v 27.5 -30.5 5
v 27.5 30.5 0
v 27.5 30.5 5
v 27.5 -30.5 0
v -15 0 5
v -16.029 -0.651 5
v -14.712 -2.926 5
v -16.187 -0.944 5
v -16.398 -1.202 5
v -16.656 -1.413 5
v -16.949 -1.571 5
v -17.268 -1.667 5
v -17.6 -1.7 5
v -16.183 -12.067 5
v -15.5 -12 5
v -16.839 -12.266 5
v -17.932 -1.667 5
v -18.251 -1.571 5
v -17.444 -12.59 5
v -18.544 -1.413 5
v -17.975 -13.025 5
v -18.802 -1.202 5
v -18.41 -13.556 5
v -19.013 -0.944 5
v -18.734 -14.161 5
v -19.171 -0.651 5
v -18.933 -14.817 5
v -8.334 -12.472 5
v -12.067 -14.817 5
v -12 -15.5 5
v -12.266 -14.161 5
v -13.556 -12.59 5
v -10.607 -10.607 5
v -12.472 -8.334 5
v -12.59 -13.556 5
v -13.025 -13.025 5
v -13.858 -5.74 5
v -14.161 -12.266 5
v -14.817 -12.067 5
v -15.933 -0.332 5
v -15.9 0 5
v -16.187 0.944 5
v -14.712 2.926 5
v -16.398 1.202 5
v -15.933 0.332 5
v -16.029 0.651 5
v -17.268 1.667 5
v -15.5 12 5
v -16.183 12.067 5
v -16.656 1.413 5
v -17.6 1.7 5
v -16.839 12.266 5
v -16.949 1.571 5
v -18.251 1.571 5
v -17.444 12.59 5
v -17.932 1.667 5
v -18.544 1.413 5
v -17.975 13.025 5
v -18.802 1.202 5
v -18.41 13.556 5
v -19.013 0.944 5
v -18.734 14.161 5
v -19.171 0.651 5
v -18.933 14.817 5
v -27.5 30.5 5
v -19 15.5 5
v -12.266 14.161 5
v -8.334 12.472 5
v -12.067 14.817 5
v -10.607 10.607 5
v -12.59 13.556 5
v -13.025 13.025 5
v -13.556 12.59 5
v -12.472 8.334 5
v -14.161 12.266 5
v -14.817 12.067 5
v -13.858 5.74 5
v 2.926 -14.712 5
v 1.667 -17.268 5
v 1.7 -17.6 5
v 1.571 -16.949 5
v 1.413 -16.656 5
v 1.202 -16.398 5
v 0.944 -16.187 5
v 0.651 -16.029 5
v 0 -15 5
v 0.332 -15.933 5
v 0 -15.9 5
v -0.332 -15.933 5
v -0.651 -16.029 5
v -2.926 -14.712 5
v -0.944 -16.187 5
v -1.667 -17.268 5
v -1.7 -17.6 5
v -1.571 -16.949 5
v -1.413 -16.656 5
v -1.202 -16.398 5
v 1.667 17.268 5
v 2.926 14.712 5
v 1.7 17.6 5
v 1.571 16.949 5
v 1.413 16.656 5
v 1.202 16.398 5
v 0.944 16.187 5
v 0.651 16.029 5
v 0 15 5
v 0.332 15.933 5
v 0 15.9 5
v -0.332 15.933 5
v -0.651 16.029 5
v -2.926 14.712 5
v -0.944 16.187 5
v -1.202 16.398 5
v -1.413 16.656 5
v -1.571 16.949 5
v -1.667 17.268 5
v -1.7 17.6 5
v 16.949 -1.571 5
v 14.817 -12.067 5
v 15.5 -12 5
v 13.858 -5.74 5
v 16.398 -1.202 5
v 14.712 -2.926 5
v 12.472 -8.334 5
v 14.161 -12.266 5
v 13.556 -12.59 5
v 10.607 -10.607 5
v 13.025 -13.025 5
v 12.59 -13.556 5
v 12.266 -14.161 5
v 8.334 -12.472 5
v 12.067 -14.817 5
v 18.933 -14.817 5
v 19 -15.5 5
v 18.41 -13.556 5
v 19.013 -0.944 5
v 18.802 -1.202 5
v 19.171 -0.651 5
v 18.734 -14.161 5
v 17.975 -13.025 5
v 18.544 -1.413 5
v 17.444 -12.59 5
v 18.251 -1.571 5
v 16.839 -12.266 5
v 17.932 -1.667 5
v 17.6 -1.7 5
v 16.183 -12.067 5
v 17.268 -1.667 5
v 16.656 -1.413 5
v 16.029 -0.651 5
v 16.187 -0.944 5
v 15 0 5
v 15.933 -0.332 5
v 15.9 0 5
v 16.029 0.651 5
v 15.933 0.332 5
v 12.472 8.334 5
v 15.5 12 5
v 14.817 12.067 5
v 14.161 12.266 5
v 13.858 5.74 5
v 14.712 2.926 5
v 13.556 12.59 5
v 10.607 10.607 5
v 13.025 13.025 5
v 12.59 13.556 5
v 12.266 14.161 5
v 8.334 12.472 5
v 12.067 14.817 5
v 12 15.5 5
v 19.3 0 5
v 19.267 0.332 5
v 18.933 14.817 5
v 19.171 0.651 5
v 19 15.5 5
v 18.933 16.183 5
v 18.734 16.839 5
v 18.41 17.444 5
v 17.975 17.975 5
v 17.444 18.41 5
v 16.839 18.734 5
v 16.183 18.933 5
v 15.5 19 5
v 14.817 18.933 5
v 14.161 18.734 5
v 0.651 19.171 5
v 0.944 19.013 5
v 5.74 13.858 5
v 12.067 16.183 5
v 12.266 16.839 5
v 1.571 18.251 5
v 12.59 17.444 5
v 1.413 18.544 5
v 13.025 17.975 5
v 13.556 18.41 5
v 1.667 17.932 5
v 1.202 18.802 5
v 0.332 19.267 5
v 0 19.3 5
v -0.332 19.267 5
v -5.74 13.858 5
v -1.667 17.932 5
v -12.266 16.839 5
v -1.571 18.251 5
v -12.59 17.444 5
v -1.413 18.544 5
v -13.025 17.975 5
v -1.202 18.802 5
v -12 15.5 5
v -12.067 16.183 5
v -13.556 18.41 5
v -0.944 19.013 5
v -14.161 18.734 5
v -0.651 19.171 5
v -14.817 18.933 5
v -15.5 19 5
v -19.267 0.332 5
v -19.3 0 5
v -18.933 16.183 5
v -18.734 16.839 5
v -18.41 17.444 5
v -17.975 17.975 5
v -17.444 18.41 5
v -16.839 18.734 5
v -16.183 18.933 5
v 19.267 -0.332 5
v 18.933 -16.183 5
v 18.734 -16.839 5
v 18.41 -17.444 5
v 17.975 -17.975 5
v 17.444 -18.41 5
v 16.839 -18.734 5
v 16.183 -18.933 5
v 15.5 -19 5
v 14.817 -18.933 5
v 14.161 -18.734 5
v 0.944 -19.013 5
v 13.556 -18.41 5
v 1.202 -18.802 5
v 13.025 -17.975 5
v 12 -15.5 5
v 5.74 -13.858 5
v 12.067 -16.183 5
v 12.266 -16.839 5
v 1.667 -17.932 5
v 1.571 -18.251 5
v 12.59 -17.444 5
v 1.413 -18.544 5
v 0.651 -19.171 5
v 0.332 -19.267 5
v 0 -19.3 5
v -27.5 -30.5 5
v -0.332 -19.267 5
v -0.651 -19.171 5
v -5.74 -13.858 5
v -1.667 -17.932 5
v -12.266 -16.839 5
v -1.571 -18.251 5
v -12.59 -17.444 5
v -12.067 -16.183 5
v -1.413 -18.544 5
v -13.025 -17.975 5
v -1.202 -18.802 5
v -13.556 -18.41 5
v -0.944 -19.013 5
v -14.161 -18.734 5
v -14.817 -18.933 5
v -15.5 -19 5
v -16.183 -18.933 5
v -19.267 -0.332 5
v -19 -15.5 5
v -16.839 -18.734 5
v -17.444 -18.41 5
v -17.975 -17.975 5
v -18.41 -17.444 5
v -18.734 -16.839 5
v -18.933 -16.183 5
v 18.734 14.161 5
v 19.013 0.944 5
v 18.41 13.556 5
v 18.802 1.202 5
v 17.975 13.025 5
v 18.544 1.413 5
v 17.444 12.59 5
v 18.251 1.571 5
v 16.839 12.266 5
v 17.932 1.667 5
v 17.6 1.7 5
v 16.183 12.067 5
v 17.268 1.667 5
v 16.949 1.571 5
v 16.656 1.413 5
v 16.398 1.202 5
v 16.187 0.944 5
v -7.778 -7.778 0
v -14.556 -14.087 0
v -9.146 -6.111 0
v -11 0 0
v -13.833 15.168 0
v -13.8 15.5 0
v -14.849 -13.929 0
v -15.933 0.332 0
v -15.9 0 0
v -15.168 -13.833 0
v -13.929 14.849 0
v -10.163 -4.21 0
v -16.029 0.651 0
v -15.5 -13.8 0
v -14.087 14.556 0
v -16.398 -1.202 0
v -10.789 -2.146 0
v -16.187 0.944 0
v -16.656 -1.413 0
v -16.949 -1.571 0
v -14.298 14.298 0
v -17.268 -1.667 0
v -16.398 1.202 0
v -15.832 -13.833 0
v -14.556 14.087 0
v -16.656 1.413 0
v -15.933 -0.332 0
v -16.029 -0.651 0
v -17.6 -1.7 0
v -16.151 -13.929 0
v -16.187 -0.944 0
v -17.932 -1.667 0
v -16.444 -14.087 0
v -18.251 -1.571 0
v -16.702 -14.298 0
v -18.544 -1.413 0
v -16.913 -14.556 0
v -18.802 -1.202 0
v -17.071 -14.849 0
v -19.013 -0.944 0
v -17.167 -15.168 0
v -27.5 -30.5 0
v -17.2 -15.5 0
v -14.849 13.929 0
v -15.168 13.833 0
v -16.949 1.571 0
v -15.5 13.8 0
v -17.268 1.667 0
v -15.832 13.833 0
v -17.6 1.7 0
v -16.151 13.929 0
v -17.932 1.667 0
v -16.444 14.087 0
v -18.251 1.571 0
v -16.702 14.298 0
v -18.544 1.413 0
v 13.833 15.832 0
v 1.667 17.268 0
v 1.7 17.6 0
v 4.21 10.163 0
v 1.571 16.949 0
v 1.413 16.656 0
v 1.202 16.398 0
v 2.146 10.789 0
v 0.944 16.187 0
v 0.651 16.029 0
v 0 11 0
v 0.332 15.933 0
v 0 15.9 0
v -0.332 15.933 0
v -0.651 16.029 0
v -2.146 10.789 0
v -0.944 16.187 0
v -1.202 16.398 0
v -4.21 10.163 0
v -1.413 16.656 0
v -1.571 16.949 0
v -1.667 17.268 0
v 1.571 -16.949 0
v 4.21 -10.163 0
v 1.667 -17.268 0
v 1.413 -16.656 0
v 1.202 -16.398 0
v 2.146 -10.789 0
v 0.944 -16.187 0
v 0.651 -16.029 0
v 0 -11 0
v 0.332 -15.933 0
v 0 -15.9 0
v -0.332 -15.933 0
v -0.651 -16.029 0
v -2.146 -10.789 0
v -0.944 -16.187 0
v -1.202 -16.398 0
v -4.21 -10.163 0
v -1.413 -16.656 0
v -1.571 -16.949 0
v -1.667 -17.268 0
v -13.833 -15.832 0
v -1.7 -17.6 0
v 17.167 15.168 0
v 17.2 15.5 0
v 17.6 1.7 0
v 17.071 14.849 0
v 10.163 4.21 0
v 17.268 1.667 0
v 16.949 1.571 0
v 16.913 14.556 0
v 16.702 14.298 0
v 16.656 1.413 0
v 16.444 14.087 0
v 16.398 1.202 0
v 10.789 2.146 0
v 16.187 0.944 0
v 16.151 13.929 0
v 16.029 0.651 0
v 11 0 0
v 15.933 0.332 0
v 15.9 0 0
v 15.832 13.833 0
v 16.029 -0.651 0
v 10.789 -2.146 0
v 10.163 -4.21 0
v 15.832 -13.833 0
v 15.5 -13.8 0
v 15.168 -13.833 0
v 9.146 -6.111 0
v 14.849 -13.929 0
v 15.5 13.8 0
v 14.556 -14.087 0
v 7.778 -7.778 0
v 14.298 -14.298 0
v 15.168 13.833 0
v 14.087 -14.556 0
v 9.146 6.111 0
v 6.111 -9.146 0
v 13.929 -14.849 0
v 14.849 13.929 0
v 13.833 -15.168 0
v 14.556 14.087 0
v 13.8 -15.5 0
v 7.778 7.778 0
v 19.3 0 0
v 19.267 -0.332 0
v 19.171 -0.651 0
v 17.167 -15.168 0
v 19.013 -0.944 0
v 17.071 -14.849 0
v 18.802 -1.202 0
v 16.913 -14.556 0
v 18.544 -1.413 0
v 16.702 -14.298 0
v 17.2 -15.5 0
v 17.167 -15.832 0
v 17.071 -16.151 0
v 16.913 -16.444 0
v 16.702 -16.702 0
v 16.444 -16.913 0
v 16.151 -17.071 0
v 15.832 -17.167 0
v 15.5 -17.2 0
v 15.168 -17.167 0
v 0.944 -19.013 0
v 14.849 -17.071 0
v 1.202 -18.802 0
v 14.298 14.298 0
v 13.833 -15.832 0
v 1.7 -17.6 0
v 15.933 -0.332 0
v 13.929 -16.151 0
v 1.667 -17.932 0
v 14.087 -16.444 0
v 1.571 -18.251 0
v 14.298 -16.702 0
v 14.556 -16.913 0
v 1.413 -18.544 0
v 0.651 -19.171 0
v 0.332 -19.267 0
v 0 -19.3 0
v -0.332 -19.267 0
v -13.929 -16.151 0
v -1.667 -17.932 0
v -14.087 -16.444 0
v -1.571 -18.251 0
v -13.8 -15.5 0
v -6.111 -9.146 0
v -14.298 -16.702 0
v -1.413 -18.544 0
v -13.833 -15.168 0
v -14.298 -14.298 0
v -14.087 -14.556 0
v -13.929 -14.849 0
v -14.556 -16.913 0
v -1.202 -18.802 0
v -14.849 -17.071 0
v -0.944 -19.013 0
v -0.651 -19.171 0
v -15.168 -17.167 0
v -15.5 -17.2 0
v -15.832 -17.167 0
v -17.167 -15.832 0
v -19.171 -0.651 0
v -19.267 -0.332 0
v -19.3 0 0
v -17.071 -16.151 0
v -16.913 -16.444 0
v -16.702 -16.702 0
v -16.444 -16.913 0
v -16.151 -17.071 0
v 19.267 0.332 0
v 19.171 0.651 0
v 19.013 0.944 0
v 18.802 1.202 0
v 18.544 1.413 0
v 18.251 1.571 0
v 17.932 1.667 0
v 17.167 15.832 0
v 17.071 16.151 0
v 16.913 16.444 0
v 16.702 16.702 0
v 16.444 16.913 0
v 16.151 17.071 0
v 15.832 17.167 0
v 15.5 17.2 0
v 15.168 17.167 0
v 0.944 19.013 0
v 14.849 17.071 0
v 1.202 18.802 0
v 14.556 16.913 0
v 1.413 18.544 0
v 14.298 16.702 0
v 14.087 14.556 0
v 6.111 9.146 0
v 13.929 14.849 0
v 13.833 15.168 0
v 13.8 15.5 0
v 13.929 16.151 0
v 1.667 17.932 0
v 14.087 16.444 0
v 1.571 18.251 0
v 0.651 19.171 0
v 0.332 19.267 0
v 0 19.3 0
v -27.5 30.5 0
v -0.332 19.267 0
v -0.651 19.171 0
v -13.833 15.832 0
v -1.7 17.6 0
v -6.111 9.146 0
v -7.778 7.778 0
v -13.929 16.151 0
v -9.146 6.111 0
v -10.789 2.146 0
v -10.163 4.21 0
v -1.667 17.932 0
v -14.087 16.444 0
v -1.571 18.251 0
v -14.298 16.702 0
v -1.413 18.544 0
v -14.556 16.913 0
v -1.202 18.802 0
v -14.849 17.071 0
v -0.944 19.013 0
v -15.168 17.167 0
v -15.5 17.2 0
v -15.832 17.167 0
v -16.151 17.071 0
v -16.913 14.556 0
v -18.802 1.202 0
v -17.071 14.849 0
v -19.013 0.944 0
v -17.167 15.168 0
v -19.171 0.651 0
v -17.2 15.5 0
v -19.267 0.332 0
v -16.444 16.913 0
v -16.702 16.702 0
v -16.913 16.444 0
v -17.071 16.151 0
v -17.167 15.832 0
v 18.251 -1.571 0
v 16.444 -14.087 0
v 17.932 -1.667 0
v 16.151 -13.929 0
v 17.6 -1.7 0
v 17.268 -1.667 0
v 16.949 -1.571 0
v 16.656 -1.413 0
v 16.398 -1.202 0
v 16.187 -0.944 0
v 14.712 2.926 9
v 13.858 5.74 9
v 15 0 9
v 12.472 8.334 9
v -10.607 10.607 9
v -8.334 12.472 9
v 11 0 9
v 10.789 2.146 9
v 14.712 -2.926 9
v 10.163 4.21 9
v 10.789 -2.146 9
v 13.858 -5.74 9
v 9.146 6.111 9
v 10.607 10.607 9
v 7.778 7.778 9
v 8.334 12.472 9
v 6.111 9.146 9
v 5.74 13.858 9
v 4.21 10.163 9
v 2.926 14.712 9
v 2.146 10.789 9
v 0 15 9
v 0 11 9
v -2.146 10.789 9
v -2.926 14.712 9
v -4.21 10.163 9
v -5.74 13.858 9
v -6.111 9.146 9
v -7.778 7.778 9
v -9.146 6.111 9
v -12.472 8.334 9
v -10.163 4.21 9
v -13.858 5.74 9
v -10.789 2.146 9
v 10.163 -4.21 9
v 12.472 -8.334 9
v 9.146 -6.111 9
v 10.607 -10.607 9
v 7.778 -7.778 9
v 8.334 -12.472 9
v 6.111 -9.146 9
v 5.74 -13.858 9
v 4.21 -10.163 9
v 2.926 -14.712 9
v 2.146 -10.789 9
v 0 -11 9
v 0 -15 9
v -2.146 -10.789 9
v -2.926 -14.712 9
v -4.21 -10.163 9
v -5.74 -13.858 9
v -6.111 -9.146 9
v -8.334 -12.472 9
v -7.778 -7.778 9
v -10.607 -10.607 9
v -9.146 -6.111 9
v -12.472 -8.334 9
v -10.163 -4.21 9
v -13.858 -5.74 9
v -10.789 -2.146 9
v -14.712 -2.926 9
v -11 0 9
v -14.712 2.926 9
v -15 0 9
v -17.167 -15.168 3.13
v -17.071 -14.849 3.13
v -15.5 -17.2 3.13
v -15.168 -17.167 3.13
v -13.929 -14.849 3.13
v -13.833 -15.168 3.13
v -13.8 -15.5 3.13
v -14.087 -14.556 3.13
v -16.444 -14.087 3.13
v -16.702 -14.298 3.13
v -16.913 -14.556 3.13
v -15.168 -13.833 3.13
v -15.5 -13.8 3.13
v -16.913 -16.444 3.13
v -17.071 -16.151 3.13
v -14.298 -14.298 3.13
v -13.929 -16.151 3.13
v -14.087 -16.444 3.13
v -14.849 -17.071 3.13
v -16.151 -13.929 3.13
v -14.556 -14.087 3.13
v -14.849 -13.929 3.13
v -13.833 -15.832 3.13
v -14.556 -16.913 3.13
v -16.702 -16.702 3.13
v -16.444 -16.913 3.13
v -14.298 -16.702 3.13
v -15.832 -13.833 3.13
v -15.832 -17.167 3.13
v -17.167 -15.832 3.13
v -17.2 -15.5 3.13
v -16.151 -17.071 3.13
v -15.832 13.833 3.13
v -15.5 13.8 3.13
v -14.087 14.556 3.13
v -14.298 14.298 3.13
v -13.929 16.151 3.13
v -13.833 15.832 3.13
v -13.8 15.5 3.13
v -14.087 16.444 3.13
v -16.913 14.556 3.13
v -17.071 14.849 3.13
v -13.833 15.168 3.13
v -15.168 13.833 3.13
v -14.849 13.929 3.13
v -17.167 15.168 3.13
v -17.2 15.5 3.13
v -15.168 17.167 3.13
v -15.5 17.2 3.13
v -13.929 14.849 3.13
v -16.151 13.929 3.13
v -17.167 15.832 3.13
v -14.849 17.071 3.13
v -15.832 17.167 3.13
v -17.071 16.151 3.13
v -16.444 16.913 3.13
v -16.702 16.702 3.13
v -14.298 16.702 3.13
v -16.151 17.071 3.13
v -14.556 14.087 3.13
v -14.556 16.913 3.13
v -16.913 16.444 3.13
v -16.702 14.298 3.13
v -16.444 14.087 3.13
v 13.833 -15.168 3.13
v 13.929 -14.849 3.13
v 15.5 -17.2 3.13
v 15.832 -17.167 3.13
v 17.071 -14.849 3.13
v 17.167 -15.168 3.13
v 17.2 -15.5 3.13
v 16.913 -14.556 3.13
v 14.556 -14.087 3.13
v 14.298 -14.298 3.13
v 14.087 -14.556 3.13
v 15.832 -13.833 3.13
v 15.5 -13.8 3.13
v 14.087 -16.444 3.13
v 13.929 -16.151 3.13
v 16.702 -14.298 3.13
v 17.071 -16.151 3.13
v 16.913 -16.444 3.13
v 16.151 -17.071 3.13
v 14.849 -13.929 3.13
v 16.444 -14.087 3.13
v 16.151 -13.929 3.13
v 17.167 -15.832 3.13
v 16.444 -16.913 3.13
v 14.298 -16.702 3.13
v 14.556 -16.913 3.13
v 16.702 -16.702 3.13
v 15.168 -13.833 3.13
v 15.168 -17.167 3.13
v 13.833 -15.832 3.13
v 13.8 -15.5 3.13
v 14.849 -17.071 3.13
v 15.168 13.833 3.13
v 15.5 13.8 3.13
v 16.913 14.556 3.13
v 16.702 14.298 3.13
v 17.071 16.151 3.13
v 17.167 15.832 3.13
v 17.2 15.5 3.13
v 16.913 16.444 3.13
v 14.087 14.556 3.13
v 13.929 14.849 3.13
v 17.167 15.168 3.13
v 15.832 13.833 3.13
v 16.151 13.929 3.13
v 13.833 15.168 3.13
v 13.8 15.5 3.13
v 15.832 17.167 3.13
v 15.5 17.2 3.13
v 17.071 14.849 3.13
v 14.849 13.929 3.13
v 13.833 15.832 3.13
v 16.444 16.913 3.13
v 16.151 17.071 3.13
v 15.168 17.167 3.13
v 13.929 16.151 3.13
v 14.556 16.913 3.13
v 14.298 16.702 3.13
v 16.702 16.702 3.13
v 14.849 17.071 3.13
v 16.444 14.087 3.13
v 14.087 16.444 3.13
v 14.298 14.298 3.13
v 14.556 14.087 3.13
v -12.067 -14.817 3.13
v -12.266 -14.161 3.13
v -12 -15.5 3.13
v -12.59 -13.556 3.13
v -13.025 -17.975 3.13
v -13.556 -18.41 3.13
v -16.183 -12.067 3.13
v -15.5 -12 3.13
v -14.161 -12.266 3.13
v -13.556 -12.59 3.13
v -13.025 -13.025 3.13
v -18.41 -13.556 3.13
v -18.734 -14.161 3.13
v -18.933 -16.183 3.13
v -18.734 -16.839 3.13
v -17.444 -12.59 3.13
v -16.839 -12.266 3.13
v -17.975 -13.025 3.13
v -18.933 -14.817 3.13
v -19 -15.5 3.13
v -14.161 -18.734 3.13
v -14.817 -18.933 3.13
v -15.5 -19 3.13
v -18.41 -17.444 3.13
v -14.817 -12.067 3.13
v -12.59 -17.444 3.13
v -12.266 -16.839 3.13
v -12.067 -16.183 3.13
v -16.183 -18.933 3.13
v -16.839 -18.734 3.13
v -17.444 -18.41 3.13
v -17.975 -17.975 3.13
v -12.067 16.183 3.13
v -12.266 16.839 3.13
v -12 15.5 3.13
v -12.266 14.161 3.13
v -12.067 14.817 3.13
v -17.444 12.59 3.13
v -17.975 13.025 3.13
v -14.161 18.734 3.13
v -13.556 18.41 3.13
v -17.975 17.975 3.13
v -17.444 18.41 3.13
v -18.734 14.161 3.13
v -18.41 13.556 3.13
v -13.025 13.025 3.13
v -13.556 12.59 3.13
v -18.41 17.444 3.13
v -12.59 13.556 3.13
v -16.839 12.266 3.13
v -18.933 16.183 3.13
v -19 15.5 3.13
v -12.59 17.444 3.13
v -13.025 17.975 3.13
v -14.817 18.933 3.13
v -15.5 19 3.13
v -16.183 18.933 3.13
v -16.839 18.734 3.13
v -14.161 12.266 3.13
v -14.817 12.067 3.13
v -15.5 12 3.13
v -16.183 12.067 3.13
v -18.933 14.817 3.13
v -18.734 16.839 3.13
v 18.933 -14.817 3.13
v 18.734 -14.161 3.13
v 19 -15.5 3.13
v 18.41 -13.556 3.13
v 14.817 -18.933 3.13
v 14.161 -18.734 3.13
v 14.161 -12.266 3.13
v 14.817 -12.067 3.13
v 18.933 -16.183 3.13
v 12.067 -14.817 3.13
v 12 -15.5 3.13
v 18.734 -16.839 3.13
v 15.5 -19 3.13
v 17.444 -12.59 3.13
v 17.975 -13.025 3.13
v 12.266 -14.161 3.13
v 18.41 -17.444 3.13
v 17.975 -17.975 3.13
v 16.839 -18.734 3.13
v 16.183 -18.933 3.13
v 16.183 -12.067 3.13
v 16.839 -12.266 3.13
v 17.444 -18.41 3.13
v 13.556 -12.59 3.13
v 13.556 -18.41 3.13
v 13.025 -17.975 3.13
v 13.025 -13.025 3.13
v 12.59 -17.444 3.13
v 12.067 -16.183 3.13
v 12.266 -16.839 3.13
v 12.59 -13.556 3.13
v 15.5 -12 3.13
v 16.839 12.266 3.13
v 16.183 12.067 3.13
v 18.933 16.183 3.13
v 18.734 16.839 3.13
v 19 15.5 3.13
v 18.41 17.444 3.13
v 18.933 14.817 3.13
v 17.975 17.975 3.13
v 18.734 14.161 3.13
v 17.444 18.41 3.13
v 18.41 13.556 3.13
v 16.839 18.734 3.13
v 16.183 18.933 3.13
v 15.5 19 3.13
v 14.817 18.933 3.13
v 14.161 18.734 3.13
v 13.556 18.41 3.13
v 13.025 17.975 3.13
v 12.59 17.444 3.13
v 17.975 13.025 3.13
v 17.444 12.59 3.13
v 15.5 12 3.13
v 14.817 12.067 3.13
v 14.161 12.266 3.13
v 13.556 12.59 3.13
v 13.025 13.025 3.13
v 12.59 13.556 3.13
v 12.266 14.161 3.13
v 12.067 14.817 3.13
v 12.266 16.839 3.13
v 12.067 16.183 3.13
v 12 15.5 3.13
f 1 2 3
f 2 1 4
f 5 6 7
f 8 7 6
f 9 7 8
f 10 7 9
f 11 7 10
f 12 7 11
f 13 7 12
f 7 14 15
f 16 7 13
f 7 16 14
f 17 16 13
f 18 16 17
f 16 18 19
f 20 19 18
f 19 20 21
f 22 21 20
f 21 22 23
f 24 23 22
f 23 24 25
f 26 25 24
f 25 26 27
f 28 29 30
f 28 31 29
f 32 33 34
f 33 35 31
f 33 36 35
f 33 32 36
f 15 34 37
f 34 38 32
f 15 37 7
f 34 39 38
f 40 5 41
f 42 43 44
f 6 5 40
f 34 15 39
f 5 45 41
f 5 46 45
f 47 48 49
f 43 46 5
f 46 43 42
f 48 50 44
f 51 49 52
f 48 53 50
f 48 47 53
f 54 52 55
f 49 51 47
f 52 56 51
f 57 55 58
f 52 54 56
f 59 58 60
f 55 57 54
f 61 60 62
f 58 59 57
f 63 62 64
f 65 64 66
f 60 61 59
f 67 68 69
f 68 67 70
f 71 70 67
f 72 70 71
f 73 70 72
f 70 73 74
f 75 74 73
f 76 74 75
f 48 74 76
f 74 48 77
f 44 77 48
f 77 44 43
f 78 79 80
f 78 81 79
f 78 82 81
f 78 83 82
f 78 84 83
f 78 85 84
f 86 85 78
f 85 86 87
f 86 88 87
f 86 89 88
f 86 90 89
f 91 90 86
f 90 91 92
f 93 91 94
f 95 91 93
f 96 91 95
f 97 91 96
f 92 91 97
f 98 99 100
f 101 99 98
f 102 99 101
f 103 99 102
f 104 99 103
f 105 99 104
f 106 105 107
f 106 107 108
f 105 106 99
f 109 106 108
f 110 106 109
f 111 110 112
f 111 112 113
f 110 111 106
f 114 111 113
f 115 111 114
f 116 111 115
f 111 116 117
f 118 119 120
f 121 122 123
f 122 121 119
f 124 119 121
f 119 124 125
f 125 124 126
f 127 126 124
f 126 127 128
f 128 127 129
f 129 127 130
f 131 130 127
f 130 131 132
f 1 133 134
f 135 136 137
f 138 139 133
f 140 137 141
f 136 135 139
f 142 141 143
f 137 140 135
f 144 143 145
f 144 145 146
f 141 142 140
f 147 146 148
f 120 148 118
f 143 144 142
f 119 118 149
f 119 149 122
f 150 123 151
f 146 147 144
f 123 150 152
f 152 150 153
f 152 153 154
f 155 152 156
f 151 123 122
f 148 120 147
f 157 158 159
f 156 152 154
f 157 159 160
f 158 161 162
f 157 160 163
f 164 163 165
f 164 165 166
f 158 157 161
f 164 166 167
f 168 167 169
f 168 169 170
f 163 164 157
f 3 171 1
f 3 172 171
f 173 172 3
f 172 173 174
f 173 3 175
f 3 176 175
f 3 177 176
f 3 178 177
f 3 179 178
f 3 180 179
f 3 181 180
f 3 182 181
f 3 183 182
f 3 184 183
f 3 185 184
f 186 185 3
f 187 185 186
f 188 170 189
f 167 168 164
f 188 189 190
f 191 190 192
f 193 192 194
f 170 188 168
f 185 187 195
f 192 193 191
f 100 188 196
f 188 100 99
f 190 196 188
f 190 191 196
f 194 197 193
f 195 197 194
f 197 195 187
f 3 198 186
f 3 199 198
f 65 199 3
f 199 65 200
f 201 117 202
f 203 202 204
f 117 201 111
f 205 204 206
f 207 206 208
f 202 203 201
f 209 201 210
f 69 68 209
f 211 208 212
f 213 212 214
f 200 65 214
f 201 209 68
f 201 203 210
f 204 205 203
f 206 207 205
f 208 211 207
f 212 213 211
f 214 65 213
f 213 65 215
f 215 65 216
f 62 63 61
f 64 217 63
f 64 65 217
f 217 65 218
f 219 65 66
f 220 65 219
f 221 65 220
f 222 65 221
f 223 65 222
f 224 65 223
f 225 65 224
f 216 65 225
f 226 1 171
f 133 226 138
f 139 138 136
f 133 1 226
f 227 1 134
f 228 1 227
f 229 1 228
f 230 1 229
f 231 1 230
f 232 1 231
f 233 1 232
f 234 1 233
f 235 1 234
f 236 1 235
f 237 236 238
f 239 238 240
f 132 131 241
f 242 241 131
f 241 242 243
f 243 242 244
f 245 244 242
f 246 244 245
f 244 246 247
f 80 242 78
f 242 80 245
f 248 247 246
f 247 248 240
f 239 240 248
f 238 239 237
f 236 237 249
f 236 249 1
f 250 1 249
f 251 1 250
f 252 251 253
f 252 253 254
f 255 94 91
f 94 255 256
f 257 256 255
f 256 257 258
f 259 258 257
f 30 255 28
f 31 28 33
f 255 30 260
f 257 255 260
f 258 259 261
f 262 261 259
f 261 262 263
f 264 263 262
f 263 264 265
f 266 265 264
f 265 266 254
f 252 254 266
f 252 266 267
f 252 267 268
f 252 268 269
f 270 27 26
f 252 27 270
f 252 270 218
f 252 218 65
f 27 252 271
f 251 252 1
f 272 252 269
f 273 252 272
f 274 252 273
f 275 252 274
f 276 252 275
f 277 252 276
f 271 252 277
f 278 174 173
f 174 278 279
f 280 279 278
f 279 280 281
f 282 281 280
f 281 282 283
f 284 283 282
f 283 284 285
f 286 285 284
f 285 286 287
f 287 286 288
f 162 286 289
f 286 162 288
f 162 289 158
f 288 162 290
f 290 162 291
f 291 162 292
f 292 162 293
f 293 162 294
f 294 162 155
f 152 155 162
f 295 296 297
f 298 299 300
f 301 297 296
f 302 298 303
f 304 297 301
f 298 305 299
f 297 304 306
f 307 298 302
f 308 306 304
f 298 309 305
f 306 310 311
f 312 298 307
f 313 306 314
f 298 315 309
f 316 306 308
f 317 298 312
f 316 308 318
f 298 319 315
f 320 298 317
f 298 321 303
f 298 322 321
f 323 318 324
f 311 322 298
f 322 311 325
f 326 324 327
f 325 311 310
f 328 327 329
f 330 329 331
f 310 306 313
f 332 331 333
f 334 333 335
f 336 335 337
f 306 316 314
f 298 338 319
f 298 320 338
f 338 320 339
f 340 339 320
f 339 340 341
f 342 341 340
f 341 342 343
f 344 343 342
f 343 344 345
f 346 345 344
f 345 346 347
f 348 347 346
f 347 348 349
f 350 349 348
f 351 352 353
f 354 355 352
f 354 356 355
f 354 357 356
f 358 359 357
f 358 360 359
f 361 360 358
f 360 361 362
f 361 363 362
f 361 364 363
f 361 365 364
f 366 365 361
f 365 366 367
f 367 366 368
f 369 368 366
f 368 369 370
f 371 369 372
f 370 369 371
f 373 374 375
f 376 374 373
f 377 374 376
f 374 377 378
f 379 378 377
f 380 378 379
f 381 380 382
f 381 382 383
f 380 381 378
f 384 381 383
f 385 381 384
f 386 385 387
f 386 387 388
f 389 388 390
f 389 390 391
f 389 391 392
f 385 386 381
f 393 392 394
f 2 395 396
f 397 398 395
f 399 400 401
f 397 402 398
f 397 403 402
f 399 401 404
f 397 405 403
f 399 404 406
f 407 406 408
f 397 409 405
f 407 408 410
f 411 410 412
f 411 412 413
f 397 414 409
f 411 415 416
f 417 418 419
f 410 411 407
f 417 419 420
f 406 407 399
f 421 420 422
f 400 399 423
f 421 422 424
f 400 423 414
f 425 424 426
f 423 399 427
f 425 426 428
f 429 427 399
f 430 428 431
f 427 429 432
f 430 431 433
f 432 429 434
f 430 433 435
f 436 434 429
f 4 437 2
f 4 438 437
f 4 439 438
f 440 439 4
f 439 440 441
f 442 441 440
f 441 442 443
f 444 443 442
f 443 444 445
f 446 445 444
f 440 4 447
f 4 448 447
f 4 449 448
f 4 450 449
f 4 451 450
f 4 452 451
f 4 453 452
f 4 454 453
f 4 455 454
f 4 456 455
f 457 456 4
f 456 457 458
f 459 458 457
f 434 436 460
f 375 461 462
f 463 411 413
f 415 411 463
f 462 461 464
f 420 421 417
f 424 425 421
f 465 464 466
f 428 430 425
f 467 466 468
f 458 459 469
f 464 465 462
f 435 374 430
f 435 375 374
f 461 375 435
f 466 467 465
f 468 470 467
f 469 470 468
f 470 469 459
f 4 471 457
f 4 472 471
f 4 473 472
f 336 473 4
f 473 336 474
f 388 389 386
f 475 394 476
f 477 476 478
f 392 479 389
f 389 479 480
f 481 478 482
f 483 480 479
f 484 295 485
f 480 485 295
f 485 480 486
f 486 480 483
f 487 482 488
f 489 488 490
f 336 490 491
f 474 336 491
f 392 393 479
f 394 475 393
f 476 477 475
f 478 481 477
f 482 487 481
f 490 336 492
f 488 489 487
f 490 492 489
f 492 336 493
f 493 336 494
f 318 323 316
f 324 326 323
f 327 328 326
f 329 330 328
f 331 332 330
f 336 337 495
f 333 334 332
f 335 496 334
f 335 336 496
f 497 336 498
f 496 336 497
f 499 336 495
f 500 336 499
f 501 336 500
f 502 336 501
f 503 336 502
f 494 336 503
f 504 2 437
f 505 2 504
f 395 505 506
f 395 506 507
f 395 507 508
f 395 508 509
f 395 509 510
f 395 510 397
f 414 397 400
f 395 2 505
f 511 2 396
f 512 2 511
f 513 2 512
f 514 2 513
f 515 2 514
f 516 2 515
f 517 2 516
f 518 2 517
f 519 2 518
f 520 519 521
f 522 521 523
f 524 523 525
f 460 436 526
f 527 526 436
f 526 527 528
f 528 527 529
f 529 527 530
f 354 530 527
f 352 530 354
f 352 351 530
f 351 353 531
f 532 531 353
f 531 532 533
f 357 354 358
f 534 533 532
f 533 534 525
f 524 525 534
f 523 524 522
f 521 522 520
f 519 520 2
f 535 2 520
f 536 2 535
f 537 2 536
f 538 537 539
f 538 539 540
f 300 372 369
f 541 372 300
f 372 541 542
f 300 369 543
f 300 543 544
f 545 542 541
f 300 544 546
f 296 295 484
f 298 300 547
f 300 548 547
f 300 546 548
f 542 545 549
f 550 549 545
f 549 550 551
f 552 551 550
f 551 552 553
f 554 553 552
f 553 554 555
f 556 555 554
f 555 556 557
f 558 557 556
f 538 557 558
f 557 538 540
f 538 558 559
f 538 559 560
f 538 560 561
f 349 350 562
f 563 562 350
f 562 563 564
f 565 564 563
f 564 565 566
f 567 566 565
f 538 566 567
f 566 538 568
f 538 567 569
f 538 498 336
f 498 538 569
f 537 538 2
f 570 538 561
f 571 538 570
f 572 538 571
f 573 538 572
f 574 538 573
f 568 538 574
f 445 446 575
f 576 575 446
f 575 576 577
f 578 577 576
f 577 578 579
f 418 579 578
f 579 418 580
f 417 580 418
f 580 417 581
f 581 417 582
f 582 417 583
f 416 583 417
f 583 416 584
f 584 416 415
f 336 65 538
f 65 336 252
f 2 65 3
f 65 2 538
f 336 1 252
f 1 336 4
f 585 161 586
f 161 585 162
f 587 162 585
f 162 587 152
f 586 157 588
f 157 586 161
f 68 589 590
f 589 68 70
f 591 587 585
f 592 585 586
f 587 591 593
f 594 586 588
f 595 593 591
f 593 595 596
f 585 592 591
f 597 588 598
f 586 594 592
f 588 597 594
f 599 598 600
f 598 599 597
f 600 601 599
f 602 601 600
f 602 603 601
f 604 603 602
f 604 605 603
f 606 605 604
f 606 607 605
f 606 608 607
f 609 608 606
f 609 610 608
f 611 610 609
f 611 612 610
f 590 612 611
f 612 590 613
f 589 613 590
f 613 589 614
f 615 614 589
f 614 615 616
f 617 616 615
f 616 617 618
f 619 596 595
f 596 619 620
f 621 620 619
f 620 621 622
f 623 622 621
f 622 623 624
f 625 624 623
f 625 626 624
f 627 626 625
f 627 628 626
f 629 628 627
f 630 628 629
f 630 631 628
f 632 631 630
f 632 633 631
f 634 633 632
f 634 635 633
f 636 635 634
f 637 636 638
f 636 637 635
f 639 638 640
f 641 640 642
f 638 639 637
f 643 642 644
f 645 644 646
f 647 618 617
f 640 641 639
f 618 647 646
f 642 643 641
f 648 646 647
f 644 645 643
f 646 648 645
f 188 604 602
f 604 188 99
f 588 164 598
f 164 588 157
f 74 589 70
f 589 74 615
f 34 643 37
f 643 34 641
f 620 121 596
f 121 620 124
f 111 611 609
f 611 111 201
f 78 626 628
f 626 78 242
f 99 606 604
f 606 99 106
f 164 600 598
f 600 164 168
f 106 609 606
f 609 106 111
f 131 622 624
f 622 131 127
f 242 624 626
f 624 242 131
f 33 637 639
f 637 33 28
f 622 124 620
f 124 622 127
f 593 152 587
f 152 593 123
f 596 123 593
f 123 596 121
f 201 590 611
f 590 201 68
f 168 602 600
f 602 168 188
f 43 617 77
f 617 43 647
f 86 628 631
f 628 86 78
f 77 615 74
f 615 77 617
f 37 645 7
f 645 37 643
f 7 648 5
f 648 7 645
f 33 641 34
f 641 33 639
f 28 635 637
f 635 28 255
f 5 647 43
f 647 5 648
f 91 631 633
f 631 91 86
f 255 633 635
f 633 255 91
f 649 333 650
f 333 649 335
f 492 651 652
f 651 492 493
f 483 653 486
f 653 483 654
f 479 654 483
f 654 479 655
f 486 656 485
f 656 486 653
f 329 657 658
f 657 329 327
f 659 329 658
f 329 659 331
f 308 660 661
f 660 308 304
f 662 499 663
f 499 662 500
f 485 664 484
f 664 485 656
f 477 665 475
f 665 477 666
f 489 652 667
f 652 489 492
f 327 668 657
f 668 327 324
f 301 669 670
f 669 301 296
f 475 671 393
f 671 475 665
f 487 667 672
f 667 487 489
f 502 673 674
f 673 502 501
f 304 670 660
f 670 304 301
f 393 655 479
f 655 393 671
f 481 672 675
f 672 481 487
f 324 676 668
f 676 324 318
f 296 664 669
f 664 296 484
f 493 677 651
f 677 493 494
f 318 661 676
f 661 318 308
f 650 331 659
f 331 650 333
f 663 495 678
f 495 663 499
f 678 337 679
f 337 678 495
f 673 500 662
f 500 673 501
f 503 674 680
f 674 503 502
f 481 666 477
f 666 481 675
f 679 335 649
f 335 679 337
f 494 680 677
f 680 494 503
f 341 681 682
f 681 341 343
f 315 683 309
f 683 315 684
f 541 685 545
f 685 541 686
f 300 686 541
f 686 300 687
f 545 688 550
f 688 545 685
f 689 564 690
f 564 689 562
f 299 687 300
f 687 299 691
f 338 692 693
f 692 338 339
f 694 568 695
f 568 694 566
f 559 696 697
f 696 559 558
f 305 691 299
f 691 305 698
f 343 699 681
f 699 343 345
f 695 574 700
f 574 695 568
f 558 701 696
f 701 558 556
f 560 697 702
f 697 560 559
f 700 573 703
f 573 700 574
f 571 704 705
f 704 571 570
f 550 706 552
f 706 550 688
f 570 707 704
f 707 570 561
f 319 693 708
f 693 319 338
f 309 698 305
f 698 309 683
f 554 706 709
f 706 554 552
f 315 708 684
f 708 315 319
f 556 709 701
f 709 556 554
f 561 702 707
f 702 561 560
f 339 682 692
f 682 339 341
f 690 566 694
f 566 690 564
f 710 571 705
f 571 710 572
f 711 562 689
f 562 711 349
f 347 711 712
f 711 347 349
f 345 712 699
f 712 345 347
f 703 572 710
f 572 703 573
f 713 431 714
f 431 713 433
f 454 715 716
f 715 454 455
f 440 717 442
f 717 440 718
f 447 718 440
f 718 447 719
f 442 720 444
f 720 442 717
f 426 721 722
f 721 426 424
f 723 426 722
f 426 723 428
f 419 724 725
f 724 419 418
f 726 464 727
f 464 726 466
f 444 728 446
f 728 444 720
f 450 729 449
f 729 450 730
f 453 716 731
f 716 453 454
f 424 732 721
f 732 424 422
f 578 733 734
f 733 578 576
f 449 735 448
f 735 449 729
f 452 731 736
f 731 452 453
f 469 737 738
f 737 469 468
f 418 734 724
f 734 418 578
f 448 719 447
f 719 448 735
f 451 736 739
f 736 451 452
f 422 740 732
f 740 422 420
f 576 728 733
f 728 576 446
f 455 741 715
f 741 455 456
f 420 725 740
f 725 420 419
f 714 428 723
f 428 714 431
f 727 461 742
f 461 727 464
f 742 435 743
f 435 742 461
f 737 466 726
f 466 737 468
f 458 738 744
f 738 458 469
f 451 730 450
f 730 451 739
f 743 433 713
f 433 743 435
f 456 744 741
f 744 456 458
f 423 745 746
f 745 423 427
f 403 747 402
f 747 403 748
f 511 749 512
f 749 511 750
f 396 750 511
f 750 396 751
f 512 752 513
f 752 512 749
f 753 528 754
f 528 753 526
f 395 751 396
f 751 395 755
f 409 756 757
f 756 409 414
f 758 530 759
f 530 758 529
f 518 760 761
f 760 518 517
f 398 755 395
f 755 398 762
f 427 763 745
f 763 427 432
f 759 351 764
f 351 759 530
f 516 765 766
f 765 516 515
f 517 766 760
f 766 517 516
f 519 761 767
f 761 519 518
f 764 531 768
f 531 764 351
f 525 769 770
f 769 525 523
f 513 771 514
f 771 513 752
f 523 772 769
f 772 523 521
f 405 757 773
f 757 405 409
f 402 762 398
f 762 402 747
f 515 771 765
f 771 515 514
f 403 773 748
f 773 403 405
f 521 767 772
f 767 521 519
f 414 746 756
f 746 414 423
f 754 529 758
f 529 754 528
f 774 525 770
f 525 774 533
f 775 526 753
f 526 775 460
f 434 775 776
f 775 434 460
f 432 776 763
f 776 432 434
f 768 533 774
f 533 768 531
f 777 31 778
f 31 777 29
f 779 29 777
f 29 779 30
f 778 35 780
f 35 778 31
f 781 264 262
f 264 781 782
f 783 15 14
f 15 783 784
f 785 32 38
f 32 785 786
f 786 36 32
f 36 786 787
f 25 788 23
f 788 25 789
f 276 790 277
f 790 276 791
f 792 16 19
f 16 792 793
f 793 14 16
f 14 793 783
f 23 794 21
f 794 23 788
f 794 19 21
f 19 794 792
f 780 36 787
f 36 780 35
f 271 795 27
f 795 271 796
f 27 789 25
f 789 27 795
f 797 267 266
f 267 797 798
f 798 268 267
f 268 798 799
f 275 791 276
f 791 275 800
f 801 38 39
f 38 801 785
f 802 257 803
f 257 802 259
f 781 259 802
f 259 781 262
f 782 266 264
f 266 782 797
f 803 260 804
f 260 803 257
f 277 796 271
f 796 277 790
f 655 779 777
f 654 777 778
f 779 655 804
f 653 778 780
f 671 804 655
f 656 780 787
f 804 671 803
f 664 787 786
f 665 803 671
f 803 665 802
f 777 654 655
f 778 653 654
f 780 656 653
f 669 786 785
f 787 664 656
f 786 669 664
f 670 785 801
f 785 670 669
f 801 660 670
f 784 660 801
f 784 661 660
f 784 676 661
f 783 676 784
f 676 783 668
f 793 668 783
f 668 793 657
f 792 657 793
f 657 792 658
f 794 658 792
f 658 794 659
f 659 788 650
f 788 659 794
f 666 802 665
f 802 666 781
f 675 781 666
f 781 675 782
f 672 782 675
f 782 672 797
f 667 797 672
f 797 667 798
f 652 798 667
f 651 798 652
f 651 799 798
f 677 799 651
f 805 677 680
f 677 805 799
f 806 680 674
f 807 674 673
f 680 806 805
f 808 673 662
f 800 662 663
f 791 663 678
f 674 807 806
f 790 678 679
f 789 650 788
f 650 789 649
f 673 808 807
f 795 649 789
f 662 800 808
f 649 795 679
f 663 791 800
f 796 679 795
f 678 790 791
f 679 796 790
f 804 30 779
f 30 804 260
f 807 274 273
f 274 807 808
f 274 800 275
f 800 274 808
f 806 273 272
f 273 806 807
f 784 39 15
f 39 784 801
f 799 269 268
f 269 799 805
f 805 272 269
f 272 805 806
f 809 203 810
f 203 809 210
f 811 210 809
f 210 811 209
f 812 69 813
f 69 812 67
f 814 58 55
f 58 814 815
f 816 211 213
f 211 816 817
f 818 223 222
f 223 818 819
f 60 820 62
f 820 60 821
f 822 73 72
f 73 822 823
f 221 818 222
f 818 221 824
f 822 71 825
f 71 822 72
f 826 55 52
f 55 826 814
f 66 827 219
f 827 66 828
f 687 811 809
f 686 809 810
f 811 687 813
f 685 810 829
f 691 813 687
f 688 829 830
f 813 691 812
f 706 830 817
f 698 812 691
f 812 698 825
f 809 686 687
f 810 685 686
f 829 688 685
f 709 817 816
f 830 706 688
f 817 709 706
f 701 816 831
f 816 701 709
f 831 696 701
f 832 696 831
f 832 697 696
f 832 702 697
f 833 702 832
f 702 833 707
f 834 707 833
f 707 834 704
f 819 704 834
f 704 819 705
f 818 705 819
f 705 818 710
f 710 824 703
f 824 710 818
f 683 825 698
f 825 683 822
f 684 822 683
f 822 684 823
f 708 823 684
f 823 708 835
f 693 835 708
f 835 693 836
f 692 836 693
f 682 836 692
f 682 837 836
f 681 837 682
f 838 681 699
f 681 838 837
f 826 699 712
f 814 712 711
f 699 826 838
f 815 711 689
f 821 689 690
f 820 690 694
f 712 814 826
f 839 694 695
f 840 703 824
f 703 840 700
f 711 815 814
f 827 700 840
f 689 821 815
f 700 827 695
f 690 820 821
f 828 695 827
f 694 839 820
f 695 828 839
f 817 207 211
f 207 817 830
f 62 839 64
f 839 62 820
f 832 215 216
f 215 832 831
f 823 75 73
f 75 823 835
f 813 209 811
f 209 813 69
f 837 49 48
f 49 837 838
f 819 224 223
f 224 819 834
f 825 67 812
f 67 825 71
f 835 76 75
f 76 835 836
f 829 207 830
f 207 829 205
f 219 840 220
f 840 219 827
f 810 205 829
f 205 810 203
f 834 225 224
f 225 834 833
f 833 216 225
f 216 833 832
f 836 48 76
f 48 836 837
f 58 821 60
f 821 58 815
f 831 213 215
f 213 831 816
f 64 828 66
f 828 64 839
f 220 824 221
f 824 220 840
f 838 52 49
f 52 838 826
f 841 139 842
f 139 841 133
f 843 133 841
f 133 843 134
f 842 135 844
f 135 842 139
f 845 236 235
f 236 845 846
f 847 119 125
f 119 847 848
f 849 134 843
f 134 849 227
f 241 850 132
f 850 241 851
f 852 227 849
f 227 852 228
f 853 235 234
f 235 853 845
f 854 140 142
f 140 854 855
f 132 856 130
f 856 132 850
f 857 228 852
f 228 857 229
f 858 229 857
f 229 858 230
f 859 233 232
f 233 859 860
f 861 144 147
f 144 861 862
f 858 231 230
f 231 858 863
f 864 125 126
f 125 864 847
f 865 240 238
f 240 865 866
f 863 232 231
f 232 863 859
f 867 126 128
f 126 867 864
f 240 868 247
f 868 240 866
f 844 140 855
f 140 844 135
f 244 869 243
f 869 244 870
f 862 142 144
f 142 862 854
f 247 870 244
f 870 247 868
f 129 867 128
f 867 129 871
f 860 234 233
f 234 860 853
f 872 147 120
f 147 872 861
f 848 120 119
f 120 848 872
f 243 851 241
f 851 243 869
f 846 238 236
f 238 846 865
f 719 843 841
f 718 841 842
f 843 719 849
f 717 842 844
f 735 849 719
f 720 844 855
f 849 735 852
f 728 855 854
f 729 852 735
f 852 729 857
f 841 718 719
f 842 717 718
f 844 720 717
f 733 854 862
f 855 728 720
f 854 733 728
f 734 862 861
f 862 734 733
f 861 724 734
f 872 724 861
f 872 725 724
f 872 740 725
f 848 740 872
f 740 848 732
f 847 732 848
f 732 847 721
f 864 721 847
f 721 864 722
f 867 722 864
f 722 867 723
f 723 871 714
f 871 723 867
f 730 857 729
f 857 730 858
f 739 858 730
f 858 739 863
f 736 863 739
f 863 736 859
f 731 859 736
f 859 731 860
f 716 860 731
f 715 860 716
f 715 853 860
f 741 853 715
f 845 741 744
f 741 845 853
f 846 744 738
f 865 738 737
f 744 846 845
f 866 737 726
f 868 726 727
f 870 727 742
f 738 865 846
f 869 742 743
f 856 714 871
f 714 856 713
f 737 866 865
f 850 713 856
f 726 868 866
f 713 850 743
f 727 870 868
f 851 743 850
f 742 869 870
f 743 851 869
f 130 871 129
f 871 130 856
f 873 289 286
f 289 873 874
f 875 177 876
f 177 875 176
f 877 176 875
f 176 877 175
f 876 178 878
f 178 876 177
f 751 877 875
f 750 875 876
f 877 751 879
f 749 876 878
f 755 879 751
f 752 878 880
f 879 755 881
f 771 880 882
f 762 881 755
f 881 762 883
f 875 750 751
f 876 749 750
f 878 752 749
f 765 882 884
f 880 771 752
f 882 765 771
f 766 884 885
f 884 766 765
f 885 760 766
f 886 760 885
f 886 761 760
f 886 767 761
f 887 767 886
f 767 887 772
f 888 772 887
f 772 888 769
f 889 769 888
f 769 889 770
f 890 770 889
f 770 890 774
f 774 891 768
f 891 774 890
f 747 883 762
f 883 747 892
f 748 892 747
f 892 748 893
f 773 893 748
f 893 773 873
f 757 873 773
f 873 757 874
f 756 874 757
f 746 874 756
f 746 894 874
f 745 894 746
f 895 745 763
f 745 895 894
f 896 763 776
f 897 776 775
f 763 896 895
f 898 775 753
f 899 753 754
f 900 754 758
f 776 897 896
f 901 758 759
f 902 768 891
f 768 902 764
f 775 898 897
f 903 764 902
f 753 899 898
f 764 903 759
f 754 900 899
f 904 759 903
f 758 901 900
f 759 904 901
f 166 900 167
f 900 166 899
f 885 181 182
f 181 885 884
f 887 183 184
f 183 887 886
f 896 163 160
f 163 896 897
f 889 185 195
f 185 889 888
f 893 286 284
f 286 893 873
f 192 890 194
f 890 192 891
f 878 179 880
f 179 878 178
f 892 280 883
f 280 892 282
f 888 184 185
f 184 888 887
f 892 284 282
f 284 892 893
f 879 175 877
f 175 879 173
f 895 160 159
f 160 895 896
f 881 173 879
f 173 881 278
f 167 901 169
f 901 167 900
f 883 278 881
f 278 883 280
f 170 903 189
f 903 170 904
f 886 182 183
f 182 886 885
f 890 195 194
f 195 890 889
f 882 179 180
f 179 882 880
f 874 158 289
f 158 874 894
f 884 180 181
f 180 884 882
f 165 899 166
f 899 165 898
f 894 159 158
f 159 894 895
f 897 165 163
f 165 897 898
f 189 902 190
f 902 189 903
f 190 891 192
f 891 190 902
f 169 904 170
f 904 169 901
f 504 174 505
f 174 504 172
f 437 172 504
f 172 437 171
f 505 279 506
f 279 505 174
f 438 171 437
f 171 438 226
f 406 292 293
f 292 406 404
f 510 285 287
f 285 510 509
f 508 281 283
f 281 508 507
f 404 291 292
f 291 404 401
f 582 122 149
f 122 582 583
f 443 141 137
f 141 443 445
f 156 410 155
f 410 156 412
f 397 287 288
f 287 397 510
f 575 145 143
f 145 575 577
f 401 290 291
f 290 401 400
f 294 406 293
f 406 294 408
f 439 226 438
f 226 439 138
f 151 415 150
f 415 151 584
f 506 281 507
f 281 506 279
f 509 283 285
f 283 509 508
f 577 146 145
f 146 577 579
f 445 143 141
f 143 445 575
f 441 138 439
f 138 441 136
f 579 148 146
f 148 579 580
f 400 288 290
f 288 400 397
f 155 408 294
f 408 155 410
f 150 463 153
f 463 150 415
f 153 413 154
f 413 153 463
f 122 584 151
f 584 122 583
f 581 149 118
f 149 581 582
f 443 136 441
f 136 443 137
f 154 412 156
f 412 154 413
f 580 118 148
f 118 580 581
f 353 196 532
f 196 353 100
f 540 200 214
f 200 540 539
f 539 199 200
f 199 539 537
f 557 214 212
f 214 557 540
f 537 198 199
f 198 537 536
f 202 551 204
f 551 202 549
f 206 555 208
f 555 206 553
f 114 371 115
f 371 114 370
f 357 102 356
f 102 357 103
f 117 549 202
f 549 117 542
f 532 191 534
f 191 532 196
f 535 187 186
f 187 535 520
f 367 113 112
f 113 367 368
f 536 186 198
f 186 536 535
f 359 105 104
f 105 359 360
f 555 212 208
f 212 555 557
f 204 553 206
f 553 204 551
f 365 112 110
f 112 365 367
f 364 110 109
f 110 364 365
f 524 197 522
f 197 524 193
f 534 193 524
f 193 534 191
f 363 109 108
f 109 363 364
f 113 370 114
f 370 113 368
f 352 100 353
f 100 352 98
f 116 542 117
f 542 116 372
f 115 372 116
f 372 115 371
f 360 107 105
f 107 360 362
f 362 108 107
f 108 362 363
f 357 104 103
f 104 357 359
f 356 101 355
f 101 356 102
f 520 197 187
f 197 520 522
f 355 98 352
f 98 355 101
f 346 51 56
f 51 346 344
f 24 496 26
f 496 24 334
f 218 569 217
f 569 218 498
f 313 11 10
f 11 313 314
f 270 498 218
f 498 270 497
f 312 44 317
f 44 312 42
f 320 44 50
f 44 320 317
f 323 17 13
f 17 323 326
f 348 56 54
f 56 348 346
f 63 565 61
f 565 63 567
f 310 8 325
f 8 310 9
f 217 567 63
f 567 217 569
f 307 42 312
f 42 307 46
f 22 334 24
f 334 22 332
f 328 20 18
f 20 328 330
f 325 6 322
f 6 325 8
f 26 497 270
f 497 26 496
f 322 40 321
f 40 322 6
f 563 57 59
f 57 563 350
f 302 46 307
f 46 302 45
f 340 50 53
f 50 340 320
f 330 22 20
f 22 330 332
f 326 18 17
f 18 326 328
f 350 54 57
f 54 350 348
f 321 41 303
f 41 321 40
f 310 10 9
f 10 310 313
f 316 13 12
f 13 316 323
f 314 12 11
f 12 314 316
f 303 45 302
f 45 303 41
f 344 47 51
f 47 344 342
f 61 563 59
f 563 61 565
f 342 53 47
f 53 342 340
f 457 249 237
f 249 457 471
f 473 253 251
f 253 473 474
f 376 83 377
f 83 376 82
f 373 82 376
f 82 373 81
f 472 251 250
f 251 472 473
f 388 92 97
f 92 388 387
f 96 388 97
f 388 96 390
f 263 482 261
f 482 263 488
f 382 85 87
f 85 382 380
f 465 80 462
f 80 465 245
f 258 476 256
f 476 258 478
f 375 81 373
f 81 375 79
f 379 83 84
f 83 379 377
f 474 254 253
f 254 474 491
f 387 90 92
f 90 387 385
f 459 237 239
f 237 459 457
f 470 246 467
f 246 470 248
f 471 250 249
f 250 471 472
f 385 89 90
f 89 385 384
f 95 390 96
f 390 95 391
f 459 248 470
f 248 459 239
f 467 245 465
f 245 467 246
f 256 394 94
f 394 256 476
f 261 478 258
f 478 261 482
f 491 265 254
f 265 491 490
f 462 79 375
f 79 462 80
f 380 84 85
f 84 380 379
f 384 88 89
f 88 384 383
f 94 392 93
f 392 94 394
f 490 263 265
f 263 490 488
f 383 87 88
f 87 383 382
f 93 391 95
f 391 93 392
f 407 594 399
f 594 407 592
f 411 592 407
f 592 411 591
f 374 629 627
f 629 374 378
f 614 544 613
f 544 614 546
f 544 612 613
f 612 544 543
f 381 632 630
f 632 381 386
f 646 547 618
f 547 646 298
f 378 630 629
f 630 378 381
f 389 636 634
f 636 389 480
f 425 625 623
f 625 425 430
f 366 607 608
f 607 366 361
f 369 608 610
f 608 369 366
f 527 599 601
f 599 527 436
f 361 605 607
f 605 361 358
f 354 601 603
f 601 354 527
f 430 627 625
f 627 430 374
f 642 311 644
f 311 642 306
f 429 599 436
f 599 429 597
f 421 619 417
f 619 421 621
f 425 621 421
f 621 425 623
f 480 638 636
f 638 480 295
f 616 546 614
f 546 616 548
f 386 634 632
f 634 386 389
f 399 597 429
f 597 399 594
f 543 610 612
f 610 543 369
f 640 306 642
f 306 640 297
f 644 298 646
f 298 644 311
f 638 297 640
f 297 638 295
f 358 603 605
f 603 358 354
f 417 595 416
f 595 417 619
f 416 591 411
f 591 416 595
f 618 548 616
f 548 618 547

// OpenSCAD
$fn = 32;

// ----------------------------------------------------------------------
// Motor mount plate: NEMA17, 55 x 61 x 9 mm
// ----------------------------------------------------------------------

// --- parameters (mm) ---
base_x = 55;              // plate length, X
base_y = 61;              // plate width, Y
thick = 5;                // plate thickness
bolt_pitch = 31;          // NEMA17 bolt spacing
motor_d = 3.4;            // NEMA17 screw clearance
boss_hole = 22;           // pilot boss bore
cb_d = 7;                 // counterbore seat
cb_h = 1.87;              // counterbore depth
boss_d = 30;              // raised pilot ring
boss_h = 4;               // raised pilot ring height
second_d = 3.4;           // second fastener hole
bc_r = 17.6;              // second bolt circle radius
bc_n = 4;                 // second bolt circle count

module plate() {
  translate([-base_x / 2, -base_y / 2, 0]) cube([base_x, base_y, thick]);
}

module motor_holes() {
  for (sx = [-1, 1]) for (sy = [-1, 1])
    translate([sx * bolt_pitch / 2, sy * bolt_pitch / 2, -1])
      cylinder(h = thick + 2, d = motor_d);
}
module motor_counterbores() {
  for (sx = [-1, 1]) for (sy = [-1, 1])
    translate([sx * bolt_pitch / 2, sy * bolt_pitch / 2, thick - cb_h])
      cylinder(h = cb_h + 0.6, d = cb_d);
}
module pilot_ring() {
  translate([0, 0, thick - 1]) cylinder(h = boss_h + 1, d = boss_d);
}

difference() {
  union() {
    plate();
    pilot_ring();
  }
  motor_holes();
  translate([0, 0, -1]) cylinder(h = thick + boss_h + 2, d = boss_hole);
  motor_counterbores();
  for (i = [0 : bc_n - 1]) rotate([0, 0, i * 360 / bc_n]) translate([bc_r, 0, -1])    cylinder(h = thick + 2, d = second_d);
}
